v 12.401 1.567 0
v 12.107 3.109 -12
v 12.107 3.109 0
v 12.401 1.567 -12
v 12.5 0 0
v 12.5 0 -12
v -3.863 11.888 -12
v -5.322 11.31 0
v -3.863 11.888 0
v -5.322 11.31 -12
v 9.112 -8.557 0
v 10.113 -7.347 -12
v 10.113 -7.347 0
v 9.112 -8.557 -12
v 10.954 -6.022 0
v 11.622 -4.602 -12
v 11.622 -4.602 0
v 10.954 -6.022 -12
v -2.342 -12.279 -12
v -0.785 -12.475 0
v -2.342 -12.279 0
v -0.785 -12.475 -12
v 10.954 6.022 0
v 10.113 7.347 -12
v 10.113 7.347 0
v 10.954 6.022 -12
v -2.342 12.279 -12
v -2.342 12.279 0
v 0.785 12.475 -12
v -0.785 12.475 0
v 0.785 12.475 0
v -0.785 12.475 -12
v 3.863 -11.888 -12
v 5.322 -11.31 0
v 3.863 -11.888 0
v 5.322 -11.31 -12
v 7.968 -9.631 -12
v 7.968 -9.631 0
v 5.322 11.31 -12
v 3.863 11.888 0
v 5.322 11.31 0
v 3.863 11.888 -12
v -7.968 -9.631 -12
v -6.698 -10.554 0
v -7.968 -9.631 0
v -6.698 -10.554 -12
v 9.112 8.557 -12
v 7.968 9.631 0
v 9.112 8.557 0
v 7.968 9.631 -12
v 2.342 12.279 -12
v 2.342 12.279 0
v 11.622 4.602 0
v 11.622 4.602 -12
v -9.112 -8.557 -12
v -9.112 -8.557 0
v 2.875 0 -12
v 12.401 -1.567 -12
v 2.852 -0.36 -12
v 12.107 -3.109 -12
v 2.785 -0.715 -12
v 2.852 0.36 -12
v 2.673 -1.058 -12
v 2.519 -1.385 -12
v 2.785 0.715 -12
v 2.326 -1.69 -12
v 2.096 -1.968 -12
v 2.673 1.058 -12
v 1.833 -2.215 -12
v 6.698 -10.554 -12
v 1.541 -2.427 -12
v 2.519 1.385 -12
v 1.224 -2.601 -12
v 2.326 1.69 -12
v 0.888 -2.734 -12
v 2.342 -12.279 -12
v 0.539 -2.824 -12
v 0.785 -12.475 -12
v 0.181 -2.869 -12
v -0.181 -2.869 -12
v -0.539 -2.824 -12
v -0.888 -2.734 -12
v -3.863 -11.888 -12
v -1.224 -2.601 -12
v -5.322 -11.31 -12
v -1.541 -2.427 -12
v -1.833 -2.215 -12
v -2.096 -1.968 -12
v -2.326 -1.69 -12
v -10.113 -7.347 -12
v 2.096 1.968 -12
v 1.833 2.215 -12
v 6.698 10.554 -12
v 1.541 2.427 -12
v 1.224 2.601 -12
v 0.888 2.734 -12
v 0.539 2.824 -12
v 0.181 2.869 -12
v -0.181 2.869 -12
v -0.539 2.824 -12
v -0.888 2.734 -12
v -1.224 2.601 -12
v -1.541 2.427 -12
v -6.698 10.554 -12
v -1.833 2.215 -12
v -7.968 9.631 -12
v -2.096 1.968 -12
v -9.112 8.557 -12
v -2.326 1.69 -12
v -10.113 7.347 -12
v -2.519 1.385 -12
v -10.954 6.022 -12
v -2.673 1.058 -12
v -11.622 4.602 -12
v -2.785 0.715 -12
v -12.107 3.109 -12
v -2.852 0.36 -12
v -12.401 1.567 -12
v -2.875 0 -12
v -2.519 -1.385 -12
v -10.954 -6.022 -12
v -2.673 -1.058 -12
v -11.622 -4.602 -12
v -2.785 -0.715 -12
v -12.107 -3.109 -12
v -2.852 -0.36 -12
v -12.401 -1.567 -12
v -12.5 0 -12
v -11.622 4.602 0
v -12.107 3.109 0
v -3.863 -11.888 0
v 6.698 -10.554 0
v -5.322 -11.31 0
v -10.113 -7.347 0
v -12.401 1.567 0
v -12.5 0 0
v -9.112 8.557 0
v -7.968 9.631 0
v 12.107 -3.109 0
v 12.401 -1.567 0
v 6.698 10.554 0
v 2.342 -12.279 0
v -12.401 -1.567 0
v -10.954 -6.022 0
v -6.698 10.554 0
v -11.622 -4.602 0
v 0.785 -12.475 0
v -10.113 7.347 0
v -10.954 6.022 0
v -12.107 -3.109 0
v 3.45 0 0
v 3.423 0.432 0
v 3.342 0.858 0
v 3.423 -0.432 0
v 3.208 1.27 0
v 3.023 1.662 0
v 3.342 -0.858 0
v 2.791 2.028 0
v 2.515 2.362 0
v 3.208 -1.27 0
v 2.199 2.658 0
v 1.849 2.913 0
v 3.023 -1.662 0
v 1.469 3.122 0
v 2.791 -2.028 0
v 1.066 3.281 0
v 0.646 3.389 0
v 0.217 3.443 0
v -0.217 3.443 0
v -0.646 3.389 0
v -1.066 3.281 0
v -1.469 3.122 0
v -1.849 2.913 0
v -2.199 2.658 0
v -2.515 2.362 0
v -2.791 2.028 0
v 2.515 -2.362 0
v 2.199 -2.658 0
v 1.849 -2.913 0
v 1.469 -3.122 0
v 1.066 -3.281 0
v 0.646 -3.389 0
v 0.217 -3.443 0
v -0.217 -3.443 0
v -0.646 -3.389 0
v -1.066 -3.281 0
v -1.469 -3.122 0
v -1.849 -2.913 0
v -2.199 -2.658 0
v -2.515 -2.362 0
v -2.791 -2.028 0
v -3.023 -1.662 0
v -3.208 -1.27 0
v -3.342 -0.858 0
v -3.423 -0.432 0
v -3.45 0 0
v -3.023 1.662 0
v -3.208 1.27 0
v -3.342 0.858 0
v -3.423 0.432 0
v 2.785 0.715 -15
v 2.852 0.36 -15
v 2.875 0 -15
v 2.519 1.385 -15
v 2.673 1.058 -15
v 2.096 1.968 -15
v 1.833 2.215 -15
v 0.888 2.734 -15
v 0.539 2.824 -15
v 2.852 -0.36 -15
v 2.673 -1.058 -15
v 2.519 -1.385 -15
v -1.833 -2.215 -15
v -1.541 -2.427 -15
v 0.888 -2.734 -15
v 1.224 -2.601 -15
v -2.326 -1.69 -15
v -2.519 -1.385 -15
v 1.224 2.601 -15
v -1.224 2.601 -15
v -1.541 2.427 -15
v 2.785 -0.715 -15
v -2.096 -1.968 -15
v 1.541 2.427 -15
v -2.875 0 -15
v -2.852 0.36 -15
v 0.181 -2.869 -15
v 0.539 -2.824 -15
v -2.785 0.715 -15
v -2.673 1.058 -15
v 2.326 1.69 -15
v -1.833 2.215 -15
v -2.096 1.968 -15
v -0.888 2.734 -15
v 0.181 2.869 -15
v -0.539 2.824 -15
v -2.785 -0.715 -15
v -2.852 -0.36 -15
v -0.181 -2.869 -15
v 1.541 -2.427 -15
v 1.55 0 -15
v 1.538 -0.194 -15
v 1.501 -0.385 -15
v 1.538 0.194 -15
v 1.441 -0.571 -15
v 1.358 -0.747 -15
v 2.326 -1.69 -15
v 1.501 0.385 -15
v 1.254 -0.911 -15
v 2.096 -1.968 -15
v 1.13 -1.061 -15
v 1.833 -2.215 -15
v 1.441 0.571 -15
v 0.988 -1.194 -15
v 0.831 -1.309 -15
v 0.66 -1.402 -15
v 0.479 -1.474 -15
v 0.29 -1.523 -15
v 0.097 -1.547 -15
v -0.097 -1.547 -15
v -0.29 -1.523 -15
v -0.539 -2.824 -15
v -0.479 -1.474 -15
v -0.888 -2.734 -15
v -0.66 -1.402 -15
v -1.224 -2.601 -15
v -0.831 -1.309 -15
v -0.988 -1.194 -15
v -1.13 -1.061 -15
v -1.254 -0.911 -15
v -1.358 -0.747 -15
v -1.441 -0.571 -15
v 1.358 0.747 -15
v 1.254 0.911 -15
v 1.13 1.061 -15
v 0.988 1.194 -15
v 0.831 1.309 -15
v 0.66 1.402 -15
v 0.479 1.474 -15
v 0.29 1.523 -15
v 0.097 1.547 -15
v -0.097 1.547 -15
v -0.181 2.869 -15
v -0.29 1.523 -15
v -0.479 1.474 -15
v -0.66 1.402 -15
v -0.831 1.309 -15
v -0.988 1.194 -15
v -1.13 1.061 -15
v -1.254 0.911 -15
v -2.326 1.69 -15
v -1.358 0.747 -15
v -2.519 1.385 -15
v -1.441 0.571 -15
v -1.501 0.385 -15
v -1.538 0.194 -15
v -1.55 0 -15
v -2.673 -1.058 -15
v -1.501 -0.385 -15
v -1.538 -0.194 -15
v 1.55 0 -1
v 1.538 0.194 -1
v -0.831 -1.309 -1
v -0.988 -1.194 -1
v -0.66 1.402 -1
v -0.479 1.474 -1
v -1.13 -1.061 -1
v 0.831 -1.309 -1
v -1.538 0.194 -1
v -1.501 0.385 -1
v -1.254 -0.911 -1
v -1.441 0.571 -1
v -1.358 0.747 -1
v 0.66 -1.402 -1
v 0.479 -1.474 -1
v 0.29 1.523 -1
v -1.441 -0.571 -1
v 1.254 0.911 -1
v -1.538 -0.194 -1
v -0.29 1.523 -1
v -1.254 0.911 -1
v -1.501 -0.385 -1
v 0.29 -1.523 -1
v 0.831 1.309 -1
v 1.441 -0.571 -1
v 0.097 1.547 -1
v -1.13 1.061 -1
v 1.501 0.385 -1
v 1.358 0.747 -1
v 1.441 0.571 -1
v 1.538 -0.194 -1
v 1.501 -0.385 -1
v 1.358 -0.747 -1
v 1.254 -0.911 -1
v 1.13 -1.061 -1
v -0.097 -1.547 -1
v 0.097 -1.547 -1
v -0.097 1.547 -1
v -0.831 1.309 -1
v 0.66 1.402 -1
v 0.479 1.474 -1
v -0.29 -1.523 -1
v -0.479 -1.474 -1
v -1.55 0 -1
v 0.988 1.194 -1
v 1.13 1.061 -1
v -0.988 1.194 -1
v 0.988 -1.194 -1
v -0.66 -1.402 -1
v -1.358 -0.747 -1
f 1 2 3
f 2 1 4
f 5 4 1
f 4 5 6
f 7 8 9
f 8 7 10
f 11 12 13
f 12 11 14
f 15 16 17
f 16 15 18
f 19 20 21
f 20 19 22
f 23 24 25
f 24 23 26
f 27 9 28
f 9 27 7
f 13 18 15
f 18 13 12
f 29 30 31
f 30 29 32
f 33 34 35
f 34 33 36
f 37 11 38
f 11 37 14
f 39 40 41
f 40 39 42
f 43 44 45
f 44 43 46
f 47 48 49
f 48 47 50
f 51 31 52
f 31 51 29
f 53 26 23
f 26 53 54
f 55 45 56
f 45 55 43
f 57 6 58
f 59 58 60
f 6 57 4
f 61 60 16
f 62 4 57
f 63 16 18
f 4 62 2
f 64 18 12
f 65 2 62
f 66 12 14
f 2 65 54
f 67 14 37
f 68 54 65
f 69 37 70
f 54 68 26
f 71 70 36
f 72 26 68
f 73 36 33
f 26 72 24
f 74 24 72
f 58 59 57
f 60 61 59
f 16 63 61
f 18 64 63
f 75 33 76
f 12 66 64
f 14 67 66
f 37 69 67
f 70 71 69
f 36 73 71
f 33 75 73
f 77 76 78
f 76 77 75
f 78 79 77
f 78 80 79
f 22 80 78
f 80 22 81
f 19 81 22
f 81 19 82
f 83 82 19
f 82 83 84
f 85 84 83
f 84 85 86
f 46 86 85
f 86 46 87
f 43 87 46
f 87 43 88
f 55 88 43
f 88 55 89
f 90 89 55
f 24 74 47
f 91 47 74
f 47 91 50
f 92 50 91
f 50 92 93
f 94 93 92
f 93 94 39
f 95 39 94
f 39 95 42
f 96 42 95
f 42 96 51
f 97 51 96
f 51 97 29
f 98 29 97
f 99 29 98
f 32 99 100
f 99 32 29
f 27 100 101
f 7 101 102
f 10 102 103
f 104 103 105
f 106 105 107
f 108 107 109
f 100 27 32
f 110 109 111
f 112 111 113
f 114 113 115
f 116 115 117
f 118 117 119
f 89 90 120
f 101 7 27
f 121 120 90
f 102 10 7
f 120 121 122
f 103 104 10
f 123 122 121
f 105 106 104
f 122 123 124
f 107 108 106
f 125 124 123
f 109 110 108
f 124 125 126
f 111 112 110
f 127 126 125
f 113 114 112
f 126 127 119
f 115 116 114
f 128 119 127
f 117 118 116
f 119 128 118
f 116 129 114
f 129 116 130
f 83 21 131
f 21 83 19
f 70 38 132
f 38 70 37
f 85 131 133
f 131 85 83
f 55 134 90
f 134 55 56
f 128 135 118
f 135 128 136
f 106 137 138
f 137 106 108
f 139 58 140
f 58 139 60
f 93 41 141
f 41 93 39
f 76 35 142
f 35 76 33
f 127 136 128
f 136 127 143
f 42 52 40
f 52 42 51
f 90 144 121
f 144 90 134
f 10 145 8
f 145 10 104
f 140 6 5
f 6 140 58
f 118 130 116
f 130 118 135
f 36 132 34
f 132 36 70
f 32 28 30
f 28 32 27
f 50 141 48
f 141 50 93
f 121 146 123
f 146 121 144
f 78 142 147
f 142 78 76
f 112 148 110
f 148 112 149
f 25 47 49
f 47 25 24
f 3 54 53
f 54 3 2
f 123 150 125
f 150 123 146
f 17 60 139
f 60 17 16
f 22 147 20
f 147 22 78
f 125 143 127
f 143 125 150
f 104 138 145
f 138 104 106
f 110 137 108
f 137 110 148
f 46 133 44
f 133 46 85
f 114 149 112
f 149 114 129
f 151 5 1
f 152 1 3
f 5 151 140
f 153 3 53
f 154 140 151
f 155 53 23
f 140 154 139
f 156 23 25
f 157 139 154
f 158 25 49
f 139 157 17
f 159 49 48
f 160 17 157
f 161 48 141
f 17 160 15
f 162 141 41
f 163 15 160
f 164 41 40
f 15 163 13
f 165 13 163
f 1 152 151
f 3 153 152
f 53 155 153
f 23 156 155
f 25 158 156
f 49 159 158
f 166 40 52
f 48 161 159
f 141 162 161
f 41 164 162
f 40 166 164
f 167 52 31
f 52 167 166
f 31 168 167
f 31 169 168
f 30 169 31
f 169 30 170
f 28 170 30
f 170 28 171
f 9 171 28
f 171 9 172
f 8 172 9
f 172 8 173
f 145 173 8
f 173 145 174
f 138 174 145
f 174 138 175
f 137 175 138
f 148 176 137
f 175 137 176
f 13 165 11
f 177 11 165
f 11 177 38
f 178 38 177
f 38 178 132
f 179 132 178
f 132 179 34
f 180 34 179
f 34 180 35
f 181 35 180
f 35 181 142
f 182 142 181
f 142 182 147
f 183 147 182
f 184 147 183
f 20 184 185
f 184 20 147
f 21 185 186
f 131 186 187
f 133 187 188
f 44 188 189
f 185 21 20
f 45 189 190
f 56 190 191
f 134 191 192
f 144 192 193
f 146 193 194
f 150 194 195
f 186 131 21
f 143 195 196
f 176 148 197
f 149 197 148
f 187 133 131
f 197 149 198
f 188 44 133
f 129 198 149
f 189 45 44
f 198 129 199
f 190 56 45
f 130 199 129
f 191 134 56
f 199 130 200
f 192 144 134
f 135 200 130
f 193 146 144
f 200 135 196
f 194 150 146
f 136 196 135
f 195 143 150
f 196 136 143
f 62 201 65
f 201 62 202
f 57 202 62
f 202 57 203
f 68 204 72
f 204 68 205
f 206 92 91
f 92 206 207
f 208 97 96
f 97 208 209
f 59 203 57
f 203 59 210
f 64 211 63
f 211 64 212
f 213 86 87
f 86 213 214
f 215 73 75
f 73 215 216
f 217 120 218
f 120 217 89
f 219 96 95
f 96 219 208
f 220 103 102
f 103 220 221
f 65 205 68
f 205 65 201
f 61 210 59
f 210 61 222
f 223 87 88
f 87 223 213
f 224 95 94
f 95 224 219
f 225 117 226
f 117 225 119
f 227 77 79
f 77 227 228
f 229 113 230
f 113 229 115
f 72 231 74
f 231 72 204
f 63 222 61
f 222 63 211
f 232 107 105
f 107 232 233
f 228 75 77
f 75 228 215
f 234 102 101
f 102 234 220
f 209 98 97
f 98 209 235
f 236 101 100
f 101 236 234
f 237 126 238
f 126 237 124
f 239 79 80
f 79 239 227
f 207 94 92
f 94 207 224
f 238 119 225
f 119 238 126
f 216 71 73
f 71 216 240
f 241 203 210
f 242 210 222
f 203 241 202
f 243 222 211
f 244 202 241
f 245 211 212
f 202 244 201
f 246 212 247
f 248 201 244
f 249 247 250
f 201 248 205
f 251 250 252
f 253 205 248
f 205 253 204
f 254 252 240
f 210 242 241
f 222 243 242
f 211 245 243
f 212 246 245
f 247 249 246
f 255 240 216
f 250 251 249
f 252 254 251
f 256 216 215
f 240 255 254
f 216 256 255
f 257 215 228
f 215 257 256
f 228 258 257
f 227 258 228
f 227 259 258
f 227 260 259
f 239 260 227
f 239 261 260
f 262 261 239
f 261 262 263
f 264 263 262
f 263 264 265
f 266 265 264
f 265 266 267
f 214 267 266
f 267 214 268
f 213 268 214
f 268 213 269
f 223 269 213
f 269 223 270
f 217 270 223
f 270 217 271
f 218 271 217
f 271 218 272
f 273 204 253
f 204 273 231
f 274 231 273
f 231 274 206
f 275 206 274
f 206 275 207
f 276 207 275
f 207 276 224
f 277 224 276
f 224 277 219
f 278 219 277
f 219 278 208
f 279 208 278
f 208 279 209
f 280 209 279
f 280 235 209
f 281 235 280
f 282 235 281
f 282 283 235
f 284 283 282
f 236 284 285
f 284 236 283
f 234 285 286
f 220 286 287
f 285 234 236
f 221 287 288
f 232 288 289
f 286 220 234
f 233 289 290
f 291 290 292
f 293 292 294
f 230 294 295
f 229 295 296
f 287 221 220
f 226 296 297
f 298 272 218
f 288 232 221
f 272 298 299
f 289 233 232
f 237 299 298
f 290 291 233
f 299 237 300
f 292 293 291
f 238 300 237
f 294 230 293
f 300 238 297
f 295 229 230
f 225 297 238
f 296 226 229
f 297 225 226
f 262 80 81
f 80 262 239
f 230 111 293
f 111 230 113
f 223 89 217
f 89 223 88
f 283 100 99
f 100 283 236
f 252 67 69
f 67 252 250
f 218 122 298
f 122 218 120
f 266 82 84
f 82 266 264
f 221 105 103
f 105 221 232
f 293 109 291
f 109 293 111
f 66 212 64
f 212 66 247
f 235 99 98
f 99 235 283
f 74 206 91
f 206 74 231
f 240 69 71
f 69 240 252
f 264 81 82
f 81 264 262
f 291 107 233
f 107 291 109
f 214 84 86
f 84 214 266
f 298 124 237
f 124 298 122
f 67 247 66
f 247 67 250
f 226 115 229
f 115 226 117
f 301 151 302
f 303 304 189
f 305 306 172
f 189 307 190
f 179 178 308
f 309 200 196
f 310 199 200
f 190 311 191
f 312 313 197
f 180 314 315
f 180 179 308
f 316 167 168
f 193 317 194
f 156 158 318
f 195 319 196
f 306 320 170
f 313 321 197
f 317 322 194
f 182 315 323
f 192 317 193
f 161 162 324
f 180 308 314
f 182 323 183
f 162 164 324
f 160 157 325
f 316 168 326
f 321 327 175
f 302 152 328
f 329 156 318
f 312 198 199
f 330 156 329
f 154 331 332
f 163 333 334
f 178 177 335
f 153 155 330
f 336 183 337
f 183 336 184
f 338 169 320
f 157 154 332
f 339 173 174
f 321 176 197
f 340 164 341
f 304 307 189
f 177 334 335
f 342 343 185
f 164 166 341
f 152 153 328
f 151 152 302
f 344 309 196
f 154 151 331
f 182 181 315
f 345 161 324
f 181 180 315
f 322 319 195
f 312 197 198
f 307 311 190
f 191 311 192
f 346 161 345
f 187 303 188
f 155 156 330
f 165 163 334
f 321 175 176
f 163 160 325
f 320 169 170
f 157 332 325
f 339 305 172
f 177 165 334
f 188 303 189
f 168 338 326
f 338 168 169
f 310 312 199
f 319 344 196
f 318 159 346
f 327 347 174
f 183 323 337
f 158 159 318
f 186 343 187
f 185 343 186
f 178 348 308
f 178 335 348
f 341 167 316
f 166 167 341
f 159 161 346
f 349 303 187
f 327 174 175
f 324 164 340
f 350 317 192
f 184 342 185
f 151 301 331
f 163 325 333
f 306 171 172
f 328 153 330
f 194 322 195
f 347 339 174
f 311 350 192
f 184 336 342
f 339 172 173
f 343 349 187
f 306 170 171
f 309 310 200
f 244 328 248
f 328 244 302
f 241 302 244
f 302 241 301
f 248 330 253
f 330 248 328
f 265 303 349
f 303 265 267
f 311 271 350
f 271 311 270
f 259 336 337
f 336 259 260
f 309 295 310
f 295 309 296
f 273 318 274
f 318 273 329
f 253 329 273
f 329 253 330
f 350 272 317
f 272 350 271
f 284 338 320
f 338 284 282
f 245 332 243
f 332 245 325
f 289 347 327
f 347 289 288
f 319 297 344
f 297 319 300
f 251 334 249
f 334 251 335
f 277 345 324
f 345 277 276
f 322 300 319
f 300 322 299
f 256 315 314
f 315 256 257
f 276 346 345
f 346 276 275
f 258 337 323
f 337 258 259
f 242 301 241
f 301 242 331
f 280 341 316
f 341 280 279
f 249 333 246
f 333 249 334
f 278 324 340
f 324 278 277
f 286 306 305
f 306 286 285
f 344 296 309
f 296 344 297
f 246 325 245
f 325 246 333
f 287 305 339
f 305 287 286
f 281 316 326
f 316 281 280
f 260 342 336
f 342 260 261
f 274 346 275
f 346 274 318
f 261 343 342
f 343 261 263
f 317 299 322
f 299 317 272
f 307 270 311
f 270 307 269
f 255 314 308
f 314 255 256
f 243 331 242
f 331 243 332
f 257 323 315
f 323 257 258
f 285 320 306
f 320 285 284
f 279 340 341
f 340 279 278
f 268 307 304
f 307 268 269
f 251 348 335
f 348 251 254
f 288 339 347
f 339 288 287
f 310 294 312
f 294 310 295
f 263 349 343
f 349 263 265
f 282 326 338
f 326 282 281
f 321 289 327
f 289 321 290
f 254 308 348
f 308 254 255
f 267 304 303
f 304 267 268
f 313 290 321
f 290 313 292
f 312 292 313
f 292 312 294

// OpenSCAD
$fn = 50;

difference() {
	union() {
		translate(v = [0, 0, -12.0]) {
			cylinder(h = 12, r = 12.5);
		}
		#translate(v = [0, 0, -15.0]) {
			cylinder(h = 15, r = 2.875);
		}
	}
	union() {
		translate(v = [0, 0, 0]) {
			rotate(a = [0, 0, 0]) {
				difference() {
					union() {
						translate(v = [0, 0, -15.0]) {
							cylinder(h = 15, r = 1.25);
						}
						translate(v = [0, 0, -1.0]) {
							cylinder(h = 1.0, r1 = 1.55, r2 = 3.45);
						}
						translate(v = [0, 0, -15.0]) {
							cylinder(h = 15, r = 1.55);
						}
						translate(v = [0, 0, -15.0]) {
							cylinder(h = 15, r = 1.25);
						}
					}
					union();
				}
			}
		}
	}
}
